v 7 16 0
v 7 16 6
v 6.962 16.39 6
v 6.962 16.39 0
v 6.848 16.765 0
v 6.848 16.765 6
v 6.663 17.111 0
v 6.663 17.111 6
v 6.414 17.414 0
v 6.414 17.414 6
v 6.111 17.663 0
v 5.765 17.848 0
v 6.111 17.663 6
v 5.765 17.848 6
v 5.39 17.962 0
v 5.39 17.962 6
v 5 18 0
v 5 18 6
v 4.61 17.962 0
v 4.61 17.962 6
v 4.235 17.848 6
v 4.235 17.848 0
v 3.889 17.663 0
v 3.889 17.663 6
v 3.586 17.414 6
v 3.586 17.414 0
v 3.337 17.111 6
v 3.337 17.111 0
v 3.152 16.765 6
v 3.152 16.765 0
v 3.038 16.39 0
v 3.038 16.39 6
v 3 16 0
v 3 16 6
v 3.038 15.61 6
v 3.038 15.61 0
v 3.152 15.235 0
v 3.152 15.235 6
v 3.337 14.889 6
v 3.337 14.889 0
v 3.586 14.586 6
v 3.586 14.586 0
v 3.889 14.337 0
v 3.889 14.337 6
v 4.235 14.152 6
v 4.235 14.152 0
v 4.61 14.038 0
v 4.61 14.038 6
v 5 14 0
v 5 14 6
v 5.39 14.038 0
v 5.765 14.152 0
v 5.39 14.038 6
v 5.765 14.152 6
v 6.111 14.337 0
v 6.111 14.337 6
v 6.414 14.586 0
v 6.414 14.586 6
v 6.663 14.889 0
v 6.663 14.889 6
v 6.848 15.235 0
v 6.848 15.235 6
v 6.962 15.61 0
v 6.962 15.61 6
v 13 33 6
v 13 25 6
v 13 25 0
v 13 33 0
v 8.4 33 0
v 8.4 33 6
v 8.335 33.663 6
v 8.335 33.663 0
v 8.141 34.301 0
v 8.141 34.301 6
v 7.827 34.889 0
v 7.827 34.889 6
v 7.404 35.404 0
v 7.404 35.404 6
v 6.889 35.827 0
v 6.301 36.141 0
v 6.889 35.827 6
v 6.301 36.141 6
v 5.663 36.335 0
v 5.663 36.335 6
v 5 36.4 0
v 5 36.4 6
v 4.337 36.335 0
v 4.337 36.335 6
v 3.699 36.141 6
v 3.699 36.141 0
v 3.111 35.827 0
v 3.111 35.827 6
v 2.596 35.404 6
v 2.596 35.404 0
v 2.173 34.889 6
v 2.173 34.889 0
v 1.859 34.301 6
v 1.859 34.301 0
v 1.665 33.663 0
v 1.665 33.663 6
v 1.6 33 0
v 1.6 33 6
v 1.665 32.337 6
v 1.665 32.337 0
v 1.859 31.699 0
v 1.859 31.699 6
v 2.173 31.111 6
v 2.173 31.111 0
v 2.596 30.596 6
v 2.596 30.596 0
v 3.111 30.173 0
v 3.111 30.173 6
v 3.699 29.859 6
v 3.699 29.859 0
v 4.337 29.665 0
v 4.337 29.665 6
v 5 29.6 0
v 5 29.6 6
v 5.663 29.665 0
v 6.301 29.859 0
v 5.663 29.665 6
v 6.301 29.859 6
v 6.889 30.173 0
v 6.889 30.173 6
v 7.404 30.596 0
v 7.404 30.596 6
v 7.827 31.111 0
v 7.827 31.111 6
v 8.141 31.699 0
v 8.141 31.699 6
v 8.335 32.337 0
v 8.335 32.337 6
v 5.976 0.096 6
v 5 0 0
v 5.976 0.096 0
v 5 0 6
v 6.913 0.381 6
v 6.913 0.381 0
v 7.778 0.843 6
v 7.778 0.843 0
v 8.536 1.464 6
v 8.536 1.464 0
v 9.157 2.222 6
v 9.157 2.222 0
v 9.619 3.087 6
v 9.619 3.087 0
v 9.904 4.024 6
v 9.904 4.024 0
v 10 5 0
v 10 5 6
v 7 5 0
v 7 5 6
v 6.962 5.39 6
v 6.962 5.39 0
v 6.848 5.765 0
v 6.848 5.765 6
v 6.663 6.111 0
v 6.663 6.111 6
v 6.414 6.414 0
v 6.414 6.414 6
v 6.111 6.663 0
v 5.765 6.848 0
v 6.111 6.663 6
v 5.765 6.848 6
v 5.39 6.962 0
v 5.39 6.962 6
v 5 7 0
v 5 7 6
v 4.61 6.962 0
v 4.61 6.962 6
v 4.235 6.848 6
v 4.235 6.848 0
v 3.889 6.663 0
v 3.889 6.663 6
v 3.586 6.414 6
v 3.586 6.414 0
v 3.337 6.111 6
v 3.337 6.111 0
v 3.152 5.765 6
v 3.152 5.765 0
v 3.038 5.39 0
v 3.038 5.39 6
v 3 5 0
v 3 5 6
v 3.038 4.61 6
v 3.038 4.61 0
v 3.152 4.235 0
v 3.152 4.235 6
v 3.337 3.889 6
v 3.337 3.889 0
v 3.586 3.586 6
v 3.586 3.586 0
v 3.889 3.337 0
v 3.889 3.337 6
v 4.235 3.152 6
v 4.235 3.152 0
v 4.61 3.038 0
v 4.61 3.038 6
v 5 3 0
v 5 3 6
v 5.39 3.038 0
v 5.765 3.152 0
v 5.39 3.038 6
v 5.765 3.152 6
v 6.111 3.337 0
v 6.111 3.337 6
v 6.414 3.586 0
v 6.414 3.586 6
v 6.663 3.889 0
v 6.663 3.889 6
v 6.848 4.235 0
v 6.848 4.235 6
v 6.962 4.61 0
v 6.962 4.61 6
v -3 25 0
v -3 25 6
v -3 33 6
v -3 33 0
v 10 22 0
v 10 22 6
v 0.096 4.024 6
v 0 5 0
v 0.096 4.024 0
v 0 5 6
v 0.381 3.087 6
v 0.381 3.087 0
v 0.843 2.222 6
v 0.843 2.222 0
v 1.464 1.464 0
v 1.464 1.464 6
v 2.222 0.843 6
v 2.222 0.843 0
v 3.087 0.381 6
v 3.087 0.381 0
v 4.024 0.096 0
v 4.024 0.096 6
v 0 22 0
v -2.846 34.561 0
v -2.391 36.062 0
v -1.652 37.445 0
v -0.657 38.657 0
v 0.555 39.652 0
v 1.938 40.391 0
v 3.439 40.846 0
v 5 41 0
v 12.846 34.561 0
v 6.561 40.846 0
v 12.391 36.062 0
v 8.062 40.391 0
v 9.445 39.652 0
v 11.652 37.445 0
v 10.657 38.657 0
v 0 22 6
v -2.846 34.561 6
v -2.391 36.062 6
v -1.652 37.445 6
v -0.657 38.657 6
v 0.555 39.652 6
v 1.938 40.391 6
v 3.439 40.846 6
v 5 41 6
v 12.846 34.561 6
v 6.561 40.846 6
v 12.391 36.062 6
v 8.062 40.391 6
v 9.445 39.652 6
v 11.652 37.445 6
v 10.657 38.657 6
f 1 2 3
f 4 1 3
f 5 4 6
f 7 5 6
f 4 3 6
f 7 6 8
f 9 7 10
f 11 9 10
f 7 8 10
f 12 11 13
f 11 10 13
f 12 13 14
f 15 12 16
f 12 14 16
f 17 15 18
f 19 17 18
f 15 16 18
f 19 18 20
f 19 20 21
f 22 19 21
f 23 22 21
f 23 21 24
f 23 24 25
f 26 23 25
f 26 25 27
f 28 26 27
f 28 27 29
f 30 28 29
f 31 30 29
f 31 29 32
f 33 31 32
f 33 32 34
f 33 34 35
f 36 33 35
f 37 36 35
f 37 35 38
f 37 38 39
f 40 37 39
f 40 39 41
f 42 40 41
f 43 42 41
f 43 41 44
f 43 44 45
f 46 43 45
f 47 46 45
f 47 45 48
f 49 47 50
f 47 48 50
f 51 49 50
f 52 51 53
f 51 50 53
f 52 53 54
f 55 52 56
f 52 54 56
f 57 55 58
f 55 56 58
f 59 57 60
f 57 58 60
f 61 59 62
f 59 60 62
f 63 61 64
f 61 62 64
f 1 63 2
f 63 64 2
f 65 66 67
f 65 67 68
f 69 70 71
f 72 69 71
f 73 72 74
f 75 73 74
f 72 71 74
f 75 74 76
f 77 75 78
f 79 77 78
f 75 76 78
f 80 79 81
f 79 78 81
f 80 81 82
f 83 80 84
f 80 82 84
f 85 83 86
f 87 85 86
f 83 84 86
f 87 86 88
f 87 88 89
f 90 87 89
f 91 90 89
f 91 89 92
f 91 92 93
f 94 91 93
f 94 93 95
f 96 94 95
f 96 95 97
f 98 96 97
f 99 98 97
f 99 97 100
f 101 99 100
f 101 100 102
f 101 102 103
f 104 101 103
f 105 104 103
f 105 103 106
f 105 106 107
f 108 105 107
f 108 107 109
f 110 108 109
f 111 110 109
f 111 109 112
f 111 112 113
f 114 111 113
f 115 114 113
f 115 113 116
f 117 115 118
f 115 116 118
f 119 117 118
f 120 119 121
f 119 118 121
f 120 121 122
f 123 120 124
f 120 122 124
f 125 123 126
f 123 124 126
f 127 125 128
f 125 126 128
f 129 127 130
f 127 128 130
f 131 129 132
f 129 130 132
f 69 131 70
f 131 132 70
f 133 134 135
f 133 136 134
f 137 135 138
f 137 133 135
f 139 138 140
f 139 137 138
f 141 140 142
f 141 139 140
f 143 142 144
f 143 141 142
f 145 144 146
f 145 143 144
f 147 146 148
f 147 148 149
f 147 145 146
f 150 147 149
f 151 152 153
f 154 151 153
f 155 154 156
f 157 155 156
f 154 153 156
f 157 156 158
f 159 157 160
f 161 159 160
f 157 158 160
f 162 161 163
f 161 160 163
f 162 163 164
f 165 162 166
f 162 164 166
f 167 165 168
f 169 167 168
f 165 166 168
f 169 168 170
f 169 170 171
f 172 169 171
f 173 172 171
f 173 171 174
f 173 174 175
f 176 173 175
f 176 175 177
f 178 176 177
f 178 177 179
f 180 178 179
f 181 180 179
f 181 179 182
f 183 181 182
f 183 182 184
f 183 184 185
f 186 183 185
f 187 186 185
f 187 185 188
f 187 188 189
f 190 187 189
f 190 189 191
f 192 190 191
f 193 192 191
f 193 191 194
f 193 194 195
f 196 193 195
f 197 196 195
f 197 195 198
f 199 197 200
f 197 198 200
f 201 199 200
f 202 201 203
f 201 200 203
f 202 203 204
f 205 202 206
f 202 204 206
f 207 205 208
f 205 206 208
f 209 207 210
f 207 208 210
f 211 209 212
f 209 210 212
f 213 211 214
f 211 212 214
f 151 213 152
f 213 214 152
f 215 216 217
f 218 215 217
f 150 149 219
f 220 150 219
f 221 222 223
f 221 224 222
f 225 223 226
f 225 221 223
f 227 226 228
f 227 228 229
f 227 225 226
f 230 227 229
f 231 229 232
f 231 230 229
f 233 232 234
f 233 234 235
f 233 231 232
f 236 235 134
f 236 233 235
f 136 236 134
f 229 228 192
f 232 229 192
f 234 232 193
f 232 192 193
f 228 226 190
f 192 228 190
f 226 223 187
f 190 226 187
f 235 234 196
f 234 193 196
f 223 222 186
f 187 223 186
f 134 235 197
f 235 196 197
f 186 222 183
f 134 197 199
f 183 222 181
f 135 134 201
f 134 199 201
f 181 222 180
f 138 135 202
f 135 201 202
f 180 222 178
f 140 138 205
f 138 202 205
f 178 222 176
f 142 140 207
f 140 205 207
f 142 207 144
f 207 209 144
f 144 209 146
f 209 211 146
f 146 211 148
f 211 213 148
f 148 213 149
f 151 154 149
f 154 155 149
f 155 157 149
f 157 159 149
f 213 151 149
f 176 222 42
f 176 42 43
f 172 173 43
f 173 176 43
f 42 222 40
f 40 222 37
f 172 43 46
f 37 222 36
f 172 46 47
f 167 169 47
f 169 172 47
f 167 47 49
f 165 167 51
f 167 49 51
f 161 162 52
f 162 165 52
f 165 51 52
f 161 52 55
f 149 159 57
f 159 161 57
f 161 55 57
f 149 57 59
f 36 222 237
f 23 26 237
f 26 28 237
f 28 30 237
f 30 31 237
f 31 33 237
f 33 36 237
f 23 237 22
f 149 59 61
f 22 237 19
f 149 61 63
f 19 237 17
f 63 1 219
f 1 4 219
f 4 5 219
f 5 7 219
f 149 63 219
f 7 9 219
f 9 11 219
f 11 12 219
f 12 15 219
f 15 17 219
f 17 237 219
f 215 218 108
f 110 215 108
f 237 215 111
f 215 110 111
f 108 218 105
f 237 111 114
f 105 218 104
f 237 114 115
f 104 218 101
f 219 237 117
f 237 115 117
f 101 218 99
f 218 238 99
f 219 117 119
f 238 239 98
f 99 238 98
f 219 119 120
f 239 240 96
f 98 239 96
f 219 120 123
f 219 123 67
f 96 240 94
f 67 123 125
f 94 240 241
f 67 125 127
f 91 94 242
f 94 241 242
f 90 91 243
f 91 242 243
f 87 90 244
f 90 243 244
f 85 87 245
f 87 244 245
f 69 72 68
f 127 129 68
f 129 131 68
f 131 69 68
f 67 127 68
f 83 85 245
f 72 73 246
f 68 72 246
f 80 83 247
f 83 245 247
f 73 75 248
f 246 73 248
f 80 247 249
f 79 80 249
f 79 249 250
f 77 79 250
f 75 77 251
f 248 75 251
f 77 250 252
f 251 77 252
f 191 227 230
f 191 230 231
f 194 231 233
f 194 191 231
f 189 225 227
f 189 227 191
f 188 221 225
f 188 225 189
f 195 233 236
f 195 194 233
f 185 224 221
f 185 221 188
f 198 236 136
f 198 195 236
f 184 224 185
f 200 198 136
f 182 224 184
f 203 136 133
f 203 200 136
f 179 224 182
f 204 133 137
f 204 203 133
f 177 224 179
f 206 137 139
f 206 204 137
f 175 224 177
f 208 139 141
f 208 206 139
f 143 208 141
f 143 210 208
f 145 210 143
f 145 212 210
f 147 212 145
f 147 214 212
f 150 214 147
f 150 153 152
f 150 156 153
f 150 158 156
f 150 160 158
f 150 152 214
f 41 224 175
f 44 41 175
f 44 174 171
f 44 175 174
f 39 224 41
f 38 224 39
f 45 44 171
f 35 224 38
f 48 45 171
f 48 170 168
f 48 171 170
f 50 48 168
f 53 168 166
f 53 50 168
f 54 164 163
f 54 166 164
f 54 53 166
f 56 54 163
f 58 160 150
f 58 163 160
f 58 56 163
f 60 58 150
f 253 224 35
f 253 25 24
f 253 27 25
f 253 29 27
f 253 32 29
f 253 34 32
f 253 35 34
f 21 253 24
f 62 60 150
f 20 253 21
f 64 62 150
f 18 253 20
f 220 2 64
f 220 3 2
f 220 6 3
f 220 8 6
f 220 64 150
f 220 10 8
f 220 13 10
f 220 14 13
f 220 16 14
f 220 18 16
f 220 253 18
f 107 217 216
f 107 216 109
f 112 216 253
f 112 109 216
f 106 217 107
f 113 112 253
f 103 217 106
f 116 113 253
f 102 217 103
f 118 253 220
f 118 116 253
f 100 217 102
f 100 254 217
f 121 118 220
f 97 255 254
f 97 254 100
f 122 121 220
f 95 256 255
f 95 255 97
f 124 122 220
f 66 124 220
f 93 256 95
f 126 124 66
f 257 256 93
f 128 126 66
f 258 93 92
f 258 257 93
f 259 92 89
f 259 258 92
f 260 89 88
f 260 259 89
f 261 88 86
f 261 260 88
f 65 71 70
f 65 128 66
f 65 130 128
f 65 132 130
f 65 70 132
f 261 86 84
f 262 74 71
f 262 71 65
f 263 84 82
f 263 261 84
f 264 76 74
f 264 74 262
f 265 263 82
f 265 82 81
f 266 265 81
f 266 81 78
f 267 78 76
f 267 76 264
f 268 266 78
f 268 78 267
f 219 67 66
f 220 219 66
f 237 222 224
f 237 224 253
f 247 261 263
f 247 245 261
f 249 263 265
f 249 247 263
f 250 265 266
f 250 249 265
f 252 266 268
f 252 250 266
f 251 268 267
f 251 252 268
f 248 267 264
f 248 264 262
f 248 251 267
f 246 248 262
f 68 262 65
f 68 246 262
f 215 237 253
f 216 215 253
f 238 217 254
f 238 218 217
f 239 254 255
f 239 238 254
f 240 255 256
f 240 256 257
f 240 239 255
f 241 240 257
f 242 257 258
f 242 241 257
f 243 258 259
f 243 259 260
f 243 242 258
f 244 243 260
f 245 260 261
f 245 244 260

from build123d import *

# Parameters (mm, degrees)
ESQUISSE1_W             = 10
ESQUISSE1_H             = 25
BOSS_EXTRU_1_DEPTH      = 6
ESQUISSE2_W             = 16
ESQUISSE2_H             = 16
BOSS_EXTRU_2_DEPTH      = 6
ESQUISSE3_R             = 3.4
ESQUISSE3_R_2           = 2
ENL_V_MAT_EXTRU_1_DEPTH = 44.428101501
CONG_1_R                = 8
CHANFREIN1_SIZE         = 3
CONG_2_R                = 5


with BuildPart() as part:
    # Esquisse1 → Boss.-Extru.1 (new body)
    with BuildSketch(Plane.XY):
        with Locations((5, 12.5)):
            Rectangle(ESQUISSE1_W, ESQUISSE1_H)
    extrude(amount=BOSS_EXTRU_1_DEPTH)

    # Esquisse2 → Boss.-Extru.2 (add)
    with BuildSketch(Plane.XY.offset(6)):
        with Locations((5, 33)):
            Rectangle(ESQUISSE2_W, ESQUISSE2_H)
    extrude(amount=-BOSS_EXTRU_2_DEPTH)

    # Esquisse3 → Enlèv. mat.-Extru.1 (cut, through all)
    with BuildSketch(Plane.XY.offset(6)):
        with Locations((5, 33)):
            Circle(ESQUISSE3_R)
        with Locations((5, 16)):
            Circle(ESQUISSE3_R_2)
        with Locations((5, 5)):
            Circle(ESQUISSE3_R_2)
    extrude(amount=-ENL_V_MAT_EXTRU_1_DEPTH, mode=Mode.SUBTRACT)

    # Congé1
    cong_1_edges = [part.edges().sort_by_distance(p)[0] for p in [
        (13, 41, 3),
        (-3, 41, 3),
    ]]
    fillet(cong_1_edges, radius=CONG_1_R - 0.0001)  # a hair under: the kernel refuses the full size

    # Chanfrein1
    chanfrein1_edges = [part.edges().sort_by_distance(p)[0] for p in [
        (10, 25, 3),
        (0, 25, 3),
    ]]
    chamfer(chanfrein1_edges, length=CHANFREIN1_SIZE - 0.0001)  # a hair under: the kernel refuses the full size

    # Congé2
    cong_2_edges = [part.edges().sort_by_distance(p)[0] for p in [
        (10, 0, 3),
        (0, 0, 3),
    ]]
    fillet(cong_2_edges, radius=CONG_2_R - 0.0001)  # a hair under: the kernel refuses the full size


solid = part.part
